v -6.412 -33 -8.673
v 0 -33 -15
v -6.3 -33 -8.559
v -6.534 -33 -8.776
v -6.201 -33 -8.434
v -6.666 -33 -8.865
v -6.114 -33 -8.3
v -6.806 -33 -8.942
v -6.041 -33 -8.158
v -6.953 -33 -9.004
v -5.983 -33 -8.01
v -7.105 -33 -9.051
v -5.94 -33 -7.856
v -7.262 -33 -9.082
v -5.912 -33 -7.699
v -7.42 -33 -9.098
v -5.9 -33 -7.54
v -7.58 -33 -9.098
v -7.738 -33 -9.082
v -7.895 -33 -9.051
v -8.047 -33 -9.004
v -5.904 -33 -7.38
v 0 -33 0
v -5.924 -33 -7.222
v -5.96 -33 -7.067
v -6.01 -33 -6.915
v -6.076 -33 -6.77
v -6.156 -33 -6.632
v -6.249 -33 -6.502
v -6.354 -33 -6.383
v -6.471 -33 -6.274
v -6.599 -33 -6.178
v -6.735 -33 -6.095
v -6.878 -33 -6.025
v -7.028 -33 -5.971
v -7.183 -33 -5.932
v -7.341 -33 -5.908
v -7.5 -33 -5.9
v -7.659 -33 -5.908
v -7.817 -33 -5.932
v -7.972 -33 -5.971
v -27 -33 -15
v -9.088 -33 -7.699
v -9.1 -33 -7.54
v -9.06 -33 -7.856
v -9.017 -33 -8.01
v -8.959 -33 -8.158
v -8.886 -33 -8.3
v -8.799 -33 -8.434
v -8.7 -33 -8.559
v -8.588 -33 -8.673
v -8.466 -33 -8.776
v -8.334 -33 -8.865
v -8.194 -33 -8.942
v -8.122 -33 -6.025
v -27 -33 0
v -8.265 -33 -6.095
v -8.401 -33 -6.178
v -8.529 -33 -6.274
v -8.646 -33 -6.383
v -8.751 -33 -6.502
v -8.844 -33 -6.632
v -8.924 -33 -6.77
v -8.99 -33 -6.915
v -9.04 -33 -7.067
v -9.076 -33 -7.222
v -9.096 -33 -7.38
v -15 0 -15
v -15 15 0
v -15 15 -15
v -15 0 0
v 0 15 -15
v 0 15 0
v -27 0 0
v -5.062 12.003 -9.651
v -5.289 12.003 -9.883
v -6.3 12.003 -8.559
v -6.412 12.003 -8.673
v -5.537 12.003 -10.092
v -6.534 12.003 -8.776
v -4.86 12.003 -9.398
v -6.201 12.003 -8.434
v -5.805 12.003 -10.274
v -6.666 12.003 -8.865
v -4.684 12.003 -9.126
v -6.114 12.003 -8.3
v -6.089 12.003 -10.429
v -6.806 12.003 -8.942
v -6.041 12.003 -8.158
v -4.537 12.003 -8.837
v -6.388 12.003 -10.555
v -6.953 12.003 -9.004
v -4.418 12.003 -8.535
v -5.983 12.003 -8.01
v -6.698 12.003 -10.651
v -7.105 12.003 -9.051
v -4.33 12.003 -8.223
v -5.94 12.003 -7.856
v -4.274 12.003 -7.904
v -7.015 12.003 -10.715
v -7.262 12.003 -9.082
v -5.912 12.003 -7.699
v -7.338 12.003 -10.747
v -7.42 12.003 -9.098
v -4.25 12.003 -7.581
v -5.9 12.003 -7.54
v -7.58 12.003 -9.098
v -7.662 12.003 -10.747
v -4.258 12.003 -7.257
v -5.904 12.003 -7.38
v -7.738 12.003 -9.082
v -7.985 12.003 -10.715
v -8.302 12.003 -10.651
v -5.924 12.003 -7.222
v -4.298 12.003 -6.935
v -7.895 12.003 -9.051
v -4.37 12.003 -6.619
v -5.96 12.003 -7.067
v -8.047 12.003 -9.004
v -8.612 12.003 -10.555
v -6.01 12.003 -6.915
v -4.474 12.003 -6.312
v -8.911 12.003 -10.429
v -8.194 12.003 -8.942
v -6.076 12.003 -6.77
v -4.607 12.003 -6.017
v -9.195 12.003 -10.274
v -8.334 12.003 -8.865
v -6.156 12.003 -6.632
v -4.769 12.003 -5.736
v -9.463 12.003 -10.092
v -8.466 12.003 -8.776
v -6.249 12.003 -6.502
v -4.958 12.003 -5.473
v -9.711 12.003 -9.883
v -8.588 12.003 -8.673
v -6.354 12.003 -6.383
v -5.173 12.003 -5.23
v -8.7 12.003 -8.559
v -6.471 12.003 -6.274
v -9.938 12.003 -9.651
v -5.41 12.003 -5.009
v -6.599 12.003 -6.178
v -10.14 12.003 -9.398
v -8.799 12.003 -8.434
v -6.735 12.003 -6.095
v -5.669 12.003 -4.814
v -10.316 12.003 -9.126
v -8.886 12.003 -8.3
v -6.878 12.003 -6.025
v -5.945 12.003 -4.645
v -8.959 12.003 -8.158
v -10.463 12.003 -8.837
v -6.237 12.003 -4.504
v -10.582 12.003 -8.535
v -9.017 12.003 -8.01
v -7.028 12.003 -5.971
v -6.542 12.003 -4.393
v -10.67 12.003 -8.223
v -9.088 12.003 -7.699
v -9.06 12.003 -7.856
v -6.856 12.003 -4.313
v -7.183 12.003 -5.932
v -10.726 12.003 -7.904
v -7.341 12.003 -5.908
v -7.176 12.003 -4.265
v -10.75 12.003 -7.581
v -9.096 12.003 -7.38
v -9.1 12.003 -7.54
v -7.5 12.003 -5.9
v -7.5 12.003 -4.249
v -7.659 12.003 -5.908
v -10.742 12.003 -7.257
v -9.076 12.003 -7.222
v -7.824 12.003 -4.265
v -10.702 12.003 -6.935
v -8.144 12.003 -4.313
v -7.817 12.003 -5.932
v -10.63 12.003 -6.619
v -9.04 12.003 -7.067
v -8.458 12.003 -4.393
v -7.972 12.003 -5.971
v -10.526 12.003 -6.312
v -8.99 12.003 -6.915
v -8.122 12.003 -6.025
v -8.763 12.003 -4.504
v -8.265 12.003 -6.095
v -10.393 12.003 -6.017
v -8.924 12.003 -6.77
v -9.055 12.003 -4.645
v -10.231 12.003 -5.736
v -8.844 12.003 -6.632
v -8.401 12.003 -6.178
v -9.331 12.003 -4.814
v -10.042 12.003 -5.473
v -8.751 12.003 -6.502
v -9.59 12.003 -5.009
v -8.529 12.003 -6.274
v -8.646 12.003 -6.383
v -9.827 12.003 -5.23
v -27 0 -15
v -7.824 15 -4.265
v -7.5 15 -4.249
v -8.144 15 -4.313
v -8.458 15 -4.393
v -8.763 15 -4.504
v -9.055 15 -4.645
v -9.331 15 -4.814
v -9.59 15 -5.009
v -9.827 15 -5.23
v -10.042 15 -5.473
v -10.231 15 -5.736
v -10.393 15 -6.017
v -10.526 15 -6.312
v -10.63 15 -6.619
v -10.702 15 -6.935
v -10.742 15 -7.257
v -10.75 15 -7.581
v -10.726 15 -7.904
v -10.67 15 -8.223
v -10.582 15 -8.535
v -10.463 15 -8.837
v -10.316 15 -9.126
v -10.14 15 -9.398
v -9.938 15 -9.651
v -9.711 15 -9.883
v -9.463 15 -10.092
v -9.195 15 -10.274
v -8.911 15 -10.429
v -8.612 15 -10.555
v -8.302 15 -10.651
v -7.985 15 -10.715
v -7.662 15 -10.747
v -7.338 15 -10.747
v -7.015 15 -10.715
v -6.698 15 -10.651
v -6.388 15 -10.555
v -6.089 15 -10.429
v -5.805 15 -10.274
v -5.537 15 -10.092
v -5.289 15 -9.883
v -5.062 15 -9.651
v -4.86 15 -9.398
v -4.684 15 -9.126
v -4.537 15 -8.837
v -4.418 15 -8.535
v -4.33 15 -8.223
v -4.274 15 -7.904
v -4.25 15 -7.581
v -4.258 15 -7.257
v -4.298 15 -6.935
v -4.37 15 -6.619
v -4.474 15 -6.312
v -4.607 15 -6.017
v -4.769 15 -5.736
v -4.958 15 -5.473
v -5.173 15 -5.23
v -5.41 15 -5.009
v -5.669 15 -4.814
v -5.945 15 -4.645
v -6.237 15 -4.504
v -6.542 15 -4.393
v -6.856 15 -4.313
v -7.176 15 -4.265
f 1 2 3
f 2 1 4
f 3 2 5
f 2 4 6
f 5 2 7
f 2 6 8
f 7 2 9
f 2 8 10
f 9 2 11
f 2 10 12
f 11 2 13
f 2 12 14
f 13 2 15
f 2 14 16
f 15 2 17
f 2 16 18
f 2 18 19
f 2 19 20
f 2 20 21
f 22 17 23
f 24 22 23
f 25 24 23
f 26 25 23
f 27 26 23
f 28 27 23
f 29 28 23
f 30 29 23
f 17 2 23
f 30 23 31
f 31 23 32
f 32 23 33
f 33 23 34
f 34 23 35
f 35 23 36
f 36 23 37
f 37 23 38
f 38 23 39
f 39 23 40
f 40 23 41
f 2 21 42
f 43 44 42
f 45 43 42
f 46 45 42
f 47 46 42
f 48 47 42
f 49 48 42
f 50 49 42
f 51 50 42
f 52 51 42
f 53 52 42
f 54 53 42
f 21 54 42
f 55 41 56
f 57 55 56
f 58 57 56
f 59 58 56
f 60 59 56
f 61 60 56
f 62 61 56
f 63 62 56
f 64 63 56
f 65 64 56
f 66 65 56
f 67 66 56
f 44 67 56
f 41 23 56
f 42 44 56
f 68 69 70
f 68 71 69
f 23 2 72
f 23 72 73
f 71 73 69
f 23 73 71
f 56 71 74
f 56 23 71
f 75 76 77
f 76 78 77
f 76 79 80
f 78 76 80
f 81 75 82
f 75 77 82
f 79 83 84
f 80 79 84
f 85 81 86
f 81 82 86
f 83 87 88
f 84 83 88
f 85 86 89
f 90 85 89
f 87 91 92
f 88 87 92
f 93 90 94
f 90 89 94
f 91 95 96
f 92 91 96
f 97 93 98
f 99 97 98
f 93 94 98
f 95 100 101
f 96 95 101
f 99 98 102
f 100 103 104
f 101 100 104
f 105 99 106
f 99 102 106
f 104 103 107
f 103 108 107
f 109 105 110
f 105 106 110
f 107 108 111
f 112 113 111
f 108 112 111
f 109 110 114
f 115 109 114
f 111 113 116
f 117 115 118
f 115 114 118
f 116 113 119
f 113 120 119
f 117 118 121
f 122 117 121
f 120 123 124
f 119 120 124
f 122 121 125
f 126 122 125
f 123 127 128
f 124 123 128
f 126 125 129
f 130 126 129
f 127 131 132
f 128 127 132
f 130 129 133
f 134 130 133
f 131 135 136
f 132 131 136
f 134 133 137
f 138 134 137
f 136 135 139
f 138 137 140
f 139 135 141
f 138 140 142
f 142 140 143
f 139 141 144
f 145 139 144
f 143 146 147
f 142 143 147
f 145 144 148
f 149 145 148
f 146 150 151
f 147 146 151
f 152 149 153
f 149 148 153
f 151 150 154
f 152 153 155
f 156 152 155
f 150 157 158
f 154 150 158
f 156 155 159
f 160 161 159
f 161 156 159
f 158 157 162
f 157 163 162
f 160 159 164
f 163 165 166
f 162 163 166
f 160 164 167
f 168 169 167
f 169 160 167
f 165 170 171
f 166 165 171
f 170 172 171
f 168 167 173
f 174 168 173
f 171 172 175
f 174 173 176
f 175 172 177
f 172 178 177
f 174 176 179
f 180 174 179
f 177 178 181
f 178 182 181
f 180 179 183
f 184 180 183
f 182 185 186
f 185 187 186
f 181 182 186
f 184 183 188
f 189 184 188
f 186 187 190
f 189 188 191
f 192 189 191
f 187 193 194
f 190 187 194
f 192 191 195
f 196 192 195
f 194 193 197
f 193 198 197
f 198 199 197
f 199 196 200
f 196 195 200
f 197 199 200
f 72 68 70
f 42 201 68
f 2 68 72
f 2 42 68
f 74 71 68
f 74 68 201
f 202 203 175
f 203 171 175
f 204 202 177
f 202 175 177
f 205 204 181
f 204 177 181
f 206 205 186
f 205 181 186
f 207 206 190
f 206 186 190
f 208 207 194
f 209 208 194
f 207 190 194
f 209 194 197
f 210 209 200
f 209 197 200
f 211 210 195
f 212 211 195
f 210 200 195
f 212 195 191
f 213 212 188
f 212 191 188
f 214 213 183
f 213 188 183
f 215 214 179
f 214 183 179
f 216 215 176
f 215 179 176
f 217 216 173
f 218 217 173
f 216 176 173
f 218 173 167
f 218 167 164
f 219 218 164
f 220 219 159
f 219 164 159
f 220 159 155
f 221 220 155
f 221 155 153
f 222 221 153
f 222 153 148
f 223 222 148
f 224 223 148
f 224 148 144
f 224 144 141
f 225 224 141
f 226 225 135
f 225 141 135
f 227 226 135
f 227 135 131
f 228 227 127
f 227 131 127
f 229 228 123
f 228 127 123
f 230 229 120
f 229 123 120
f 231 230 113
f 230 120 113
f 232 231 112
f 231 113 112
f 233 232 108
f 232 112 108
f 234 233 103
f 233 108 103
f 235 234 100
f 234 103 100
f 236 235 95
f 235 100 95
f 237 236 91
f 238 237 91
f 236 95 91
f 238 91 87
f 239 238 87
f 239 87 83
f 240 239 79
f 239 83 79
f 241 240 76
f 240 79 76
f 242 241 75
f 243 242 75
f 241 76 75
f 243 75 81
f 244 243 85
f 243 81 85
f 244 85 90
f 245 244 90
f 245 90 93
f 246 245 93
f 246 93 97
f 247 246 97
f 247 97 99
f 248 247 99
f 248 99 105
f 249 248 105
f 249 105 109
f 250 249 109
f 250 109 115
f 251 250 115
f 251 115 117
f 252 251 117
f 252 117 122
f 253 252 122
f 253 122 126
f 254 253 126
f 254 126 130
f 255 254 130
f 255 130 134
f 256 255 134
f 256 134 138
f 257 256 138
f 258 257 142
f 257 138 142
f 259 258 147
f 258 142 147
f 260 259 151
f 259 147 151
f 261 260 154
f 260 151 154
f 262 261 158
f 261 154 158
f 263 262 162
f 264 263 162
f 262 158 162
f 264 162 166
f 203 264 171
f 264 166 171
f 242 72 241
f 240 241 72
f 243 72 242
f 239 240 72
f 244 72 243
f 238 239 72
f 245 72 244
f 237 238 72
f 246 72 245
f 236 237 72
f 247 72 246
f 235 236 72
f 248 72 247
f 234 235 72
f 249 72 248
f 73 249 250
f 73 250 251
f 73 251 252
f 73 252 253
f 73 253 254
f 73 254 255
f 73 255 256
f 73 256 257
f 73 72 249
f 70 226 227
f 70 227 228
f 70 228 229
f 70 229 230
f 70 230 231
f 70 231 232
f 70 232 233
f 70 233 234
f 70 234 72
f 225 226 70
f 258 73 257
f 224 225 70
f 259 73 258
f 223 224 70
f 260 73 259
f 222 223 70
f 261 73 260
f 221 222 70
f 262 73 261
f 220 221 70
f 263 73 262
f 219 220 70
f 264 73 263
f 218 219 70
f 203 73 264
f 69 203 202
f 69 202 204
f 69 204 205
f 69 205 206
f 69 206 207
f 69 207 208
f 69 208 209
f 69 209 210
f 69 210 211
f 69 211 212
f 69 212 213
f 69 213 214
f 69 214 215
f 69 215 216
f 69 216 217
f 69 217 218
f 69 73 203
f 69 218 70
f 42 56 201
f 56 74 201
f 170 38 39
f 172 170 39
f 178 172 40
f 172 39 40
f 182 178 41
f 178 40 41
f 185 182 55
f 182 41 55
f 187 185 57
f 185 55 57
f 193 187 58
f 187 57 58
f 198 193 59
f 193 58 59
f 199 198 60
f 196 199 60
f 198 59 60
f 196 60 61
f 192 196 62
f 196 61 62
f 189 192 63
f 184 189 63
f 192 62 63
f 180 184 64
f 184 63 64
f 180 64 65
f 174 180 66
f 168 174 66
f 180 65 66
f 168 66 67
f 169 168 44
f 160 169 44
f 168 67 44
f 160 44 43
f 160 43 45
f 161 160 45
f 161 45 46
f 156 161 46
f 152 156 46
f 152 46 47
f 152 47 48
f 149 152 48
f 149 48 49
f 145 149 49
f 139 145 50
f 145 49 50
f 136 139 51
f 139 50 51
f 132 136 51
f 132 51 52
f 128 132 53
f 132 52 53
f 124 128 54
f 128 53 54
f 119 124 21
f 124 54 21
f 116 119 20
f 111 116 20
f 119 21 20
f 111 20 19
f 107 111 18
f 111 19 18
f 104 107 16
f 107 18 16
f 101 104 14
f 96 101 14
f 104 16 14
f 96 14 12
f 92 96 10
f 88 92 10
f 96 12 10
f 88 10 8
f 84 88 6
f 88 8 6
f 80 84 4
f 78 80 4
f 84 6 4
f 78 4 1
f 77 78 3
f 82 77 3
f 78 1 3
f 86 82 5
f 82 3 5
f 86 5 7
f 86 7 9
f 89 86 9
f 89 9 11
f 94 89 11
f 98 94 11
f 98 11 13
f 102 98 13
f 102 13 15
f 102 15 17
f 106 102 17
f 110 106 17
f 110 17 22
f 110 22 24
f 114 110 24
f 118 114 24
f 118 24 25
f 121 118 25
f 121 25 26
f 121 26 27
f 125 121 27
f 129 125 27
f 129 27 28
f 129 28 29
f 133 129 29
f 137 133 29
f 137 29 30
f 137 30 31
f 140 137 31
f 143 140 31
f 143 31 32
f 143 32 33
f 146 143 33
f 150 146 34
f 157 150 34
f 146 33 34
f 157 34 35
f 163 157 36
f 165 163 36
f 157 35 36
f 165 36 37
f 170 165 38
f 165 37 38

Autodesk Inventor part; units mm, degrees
ref_plane "YZ Plane" through (0, 0, 0) normal (1, 0, 0) x (0, 1, 0)
ref_plane "XZ Plane" through (0, 0, 0) normal (0, 1, 0) x (-1, 0, 0)
ref_plane "XY Plane" through (0, 0, 0) normal (0, 0, 1) x (1, 0, 0)
sketch "Base Profile" plane through (0, 0, 0) normal (0, 1, 0) x (-1, 0, 0)
  line L0 (0, 0) -> (15, 0)
  line L1 (15, 0) -> (15, -15)
  line L2 (15, -15) -> (0, -15)
  line L3 (0, -15) -> (0, 0)
  line L4 (15, 0) -> (27, 0)
  line L5 (27, 0) -> (27, -15)
  line L6 (27, -15) -> (15, -15)
  dimension "d413" = 15
  dimension "d414" = 15
  dimension "d417" = 12
extrude "Stock" add sketch "Base Profile" against normal blind 33
extrude "Extrusion Post" add sketch "Base Profile" along normal blind 15 contours L0 L1 L2 L3
sketch "Sketch39" plane through (0, 15, 0) normal (0, 1, 0) x (1, 0, 0)
  line L0 (0, 15) -> (-15, 15) projected
  line L1 (-15, 15) -> (-15, 0) projected
  line L2 (-15, 0) -> (0, 0) projected
  line L3 (0, 0) -> (0, 15) projected
  circle A0 centre (-7.5, 7.5) radius 3.175
  point P0 (0, 7.5)
  point P1 (-7.5, 0)
  dimension "d418" = 6.35
hole "Hole27" at (-7.5, 15, -7.5) direction (0, -1, 0) diameter 3.2004 end through all counterbore diameter 6.5024 counterbore depth 2.9972 clearance for "Socket Head Cap Screw" size "M3" standard "Ansi Metric M Profile"
equation "\"d168\" = extrusionOffset"
equation "\"extrusionWidth\" = 15"
equation "\"idlerLength\" = 12"
equation "\"bearingOffsetFromBottom\" = 7.5"
equation "\"extrusionOffset\" = 33"
equation "\"bearingStackHeight\" = 9"
equation "\"bearingClearance\" = 13"
equation "\"pinSupportLength\" = 2"
properties part number "A Idler" material "Aluminum 6061"
